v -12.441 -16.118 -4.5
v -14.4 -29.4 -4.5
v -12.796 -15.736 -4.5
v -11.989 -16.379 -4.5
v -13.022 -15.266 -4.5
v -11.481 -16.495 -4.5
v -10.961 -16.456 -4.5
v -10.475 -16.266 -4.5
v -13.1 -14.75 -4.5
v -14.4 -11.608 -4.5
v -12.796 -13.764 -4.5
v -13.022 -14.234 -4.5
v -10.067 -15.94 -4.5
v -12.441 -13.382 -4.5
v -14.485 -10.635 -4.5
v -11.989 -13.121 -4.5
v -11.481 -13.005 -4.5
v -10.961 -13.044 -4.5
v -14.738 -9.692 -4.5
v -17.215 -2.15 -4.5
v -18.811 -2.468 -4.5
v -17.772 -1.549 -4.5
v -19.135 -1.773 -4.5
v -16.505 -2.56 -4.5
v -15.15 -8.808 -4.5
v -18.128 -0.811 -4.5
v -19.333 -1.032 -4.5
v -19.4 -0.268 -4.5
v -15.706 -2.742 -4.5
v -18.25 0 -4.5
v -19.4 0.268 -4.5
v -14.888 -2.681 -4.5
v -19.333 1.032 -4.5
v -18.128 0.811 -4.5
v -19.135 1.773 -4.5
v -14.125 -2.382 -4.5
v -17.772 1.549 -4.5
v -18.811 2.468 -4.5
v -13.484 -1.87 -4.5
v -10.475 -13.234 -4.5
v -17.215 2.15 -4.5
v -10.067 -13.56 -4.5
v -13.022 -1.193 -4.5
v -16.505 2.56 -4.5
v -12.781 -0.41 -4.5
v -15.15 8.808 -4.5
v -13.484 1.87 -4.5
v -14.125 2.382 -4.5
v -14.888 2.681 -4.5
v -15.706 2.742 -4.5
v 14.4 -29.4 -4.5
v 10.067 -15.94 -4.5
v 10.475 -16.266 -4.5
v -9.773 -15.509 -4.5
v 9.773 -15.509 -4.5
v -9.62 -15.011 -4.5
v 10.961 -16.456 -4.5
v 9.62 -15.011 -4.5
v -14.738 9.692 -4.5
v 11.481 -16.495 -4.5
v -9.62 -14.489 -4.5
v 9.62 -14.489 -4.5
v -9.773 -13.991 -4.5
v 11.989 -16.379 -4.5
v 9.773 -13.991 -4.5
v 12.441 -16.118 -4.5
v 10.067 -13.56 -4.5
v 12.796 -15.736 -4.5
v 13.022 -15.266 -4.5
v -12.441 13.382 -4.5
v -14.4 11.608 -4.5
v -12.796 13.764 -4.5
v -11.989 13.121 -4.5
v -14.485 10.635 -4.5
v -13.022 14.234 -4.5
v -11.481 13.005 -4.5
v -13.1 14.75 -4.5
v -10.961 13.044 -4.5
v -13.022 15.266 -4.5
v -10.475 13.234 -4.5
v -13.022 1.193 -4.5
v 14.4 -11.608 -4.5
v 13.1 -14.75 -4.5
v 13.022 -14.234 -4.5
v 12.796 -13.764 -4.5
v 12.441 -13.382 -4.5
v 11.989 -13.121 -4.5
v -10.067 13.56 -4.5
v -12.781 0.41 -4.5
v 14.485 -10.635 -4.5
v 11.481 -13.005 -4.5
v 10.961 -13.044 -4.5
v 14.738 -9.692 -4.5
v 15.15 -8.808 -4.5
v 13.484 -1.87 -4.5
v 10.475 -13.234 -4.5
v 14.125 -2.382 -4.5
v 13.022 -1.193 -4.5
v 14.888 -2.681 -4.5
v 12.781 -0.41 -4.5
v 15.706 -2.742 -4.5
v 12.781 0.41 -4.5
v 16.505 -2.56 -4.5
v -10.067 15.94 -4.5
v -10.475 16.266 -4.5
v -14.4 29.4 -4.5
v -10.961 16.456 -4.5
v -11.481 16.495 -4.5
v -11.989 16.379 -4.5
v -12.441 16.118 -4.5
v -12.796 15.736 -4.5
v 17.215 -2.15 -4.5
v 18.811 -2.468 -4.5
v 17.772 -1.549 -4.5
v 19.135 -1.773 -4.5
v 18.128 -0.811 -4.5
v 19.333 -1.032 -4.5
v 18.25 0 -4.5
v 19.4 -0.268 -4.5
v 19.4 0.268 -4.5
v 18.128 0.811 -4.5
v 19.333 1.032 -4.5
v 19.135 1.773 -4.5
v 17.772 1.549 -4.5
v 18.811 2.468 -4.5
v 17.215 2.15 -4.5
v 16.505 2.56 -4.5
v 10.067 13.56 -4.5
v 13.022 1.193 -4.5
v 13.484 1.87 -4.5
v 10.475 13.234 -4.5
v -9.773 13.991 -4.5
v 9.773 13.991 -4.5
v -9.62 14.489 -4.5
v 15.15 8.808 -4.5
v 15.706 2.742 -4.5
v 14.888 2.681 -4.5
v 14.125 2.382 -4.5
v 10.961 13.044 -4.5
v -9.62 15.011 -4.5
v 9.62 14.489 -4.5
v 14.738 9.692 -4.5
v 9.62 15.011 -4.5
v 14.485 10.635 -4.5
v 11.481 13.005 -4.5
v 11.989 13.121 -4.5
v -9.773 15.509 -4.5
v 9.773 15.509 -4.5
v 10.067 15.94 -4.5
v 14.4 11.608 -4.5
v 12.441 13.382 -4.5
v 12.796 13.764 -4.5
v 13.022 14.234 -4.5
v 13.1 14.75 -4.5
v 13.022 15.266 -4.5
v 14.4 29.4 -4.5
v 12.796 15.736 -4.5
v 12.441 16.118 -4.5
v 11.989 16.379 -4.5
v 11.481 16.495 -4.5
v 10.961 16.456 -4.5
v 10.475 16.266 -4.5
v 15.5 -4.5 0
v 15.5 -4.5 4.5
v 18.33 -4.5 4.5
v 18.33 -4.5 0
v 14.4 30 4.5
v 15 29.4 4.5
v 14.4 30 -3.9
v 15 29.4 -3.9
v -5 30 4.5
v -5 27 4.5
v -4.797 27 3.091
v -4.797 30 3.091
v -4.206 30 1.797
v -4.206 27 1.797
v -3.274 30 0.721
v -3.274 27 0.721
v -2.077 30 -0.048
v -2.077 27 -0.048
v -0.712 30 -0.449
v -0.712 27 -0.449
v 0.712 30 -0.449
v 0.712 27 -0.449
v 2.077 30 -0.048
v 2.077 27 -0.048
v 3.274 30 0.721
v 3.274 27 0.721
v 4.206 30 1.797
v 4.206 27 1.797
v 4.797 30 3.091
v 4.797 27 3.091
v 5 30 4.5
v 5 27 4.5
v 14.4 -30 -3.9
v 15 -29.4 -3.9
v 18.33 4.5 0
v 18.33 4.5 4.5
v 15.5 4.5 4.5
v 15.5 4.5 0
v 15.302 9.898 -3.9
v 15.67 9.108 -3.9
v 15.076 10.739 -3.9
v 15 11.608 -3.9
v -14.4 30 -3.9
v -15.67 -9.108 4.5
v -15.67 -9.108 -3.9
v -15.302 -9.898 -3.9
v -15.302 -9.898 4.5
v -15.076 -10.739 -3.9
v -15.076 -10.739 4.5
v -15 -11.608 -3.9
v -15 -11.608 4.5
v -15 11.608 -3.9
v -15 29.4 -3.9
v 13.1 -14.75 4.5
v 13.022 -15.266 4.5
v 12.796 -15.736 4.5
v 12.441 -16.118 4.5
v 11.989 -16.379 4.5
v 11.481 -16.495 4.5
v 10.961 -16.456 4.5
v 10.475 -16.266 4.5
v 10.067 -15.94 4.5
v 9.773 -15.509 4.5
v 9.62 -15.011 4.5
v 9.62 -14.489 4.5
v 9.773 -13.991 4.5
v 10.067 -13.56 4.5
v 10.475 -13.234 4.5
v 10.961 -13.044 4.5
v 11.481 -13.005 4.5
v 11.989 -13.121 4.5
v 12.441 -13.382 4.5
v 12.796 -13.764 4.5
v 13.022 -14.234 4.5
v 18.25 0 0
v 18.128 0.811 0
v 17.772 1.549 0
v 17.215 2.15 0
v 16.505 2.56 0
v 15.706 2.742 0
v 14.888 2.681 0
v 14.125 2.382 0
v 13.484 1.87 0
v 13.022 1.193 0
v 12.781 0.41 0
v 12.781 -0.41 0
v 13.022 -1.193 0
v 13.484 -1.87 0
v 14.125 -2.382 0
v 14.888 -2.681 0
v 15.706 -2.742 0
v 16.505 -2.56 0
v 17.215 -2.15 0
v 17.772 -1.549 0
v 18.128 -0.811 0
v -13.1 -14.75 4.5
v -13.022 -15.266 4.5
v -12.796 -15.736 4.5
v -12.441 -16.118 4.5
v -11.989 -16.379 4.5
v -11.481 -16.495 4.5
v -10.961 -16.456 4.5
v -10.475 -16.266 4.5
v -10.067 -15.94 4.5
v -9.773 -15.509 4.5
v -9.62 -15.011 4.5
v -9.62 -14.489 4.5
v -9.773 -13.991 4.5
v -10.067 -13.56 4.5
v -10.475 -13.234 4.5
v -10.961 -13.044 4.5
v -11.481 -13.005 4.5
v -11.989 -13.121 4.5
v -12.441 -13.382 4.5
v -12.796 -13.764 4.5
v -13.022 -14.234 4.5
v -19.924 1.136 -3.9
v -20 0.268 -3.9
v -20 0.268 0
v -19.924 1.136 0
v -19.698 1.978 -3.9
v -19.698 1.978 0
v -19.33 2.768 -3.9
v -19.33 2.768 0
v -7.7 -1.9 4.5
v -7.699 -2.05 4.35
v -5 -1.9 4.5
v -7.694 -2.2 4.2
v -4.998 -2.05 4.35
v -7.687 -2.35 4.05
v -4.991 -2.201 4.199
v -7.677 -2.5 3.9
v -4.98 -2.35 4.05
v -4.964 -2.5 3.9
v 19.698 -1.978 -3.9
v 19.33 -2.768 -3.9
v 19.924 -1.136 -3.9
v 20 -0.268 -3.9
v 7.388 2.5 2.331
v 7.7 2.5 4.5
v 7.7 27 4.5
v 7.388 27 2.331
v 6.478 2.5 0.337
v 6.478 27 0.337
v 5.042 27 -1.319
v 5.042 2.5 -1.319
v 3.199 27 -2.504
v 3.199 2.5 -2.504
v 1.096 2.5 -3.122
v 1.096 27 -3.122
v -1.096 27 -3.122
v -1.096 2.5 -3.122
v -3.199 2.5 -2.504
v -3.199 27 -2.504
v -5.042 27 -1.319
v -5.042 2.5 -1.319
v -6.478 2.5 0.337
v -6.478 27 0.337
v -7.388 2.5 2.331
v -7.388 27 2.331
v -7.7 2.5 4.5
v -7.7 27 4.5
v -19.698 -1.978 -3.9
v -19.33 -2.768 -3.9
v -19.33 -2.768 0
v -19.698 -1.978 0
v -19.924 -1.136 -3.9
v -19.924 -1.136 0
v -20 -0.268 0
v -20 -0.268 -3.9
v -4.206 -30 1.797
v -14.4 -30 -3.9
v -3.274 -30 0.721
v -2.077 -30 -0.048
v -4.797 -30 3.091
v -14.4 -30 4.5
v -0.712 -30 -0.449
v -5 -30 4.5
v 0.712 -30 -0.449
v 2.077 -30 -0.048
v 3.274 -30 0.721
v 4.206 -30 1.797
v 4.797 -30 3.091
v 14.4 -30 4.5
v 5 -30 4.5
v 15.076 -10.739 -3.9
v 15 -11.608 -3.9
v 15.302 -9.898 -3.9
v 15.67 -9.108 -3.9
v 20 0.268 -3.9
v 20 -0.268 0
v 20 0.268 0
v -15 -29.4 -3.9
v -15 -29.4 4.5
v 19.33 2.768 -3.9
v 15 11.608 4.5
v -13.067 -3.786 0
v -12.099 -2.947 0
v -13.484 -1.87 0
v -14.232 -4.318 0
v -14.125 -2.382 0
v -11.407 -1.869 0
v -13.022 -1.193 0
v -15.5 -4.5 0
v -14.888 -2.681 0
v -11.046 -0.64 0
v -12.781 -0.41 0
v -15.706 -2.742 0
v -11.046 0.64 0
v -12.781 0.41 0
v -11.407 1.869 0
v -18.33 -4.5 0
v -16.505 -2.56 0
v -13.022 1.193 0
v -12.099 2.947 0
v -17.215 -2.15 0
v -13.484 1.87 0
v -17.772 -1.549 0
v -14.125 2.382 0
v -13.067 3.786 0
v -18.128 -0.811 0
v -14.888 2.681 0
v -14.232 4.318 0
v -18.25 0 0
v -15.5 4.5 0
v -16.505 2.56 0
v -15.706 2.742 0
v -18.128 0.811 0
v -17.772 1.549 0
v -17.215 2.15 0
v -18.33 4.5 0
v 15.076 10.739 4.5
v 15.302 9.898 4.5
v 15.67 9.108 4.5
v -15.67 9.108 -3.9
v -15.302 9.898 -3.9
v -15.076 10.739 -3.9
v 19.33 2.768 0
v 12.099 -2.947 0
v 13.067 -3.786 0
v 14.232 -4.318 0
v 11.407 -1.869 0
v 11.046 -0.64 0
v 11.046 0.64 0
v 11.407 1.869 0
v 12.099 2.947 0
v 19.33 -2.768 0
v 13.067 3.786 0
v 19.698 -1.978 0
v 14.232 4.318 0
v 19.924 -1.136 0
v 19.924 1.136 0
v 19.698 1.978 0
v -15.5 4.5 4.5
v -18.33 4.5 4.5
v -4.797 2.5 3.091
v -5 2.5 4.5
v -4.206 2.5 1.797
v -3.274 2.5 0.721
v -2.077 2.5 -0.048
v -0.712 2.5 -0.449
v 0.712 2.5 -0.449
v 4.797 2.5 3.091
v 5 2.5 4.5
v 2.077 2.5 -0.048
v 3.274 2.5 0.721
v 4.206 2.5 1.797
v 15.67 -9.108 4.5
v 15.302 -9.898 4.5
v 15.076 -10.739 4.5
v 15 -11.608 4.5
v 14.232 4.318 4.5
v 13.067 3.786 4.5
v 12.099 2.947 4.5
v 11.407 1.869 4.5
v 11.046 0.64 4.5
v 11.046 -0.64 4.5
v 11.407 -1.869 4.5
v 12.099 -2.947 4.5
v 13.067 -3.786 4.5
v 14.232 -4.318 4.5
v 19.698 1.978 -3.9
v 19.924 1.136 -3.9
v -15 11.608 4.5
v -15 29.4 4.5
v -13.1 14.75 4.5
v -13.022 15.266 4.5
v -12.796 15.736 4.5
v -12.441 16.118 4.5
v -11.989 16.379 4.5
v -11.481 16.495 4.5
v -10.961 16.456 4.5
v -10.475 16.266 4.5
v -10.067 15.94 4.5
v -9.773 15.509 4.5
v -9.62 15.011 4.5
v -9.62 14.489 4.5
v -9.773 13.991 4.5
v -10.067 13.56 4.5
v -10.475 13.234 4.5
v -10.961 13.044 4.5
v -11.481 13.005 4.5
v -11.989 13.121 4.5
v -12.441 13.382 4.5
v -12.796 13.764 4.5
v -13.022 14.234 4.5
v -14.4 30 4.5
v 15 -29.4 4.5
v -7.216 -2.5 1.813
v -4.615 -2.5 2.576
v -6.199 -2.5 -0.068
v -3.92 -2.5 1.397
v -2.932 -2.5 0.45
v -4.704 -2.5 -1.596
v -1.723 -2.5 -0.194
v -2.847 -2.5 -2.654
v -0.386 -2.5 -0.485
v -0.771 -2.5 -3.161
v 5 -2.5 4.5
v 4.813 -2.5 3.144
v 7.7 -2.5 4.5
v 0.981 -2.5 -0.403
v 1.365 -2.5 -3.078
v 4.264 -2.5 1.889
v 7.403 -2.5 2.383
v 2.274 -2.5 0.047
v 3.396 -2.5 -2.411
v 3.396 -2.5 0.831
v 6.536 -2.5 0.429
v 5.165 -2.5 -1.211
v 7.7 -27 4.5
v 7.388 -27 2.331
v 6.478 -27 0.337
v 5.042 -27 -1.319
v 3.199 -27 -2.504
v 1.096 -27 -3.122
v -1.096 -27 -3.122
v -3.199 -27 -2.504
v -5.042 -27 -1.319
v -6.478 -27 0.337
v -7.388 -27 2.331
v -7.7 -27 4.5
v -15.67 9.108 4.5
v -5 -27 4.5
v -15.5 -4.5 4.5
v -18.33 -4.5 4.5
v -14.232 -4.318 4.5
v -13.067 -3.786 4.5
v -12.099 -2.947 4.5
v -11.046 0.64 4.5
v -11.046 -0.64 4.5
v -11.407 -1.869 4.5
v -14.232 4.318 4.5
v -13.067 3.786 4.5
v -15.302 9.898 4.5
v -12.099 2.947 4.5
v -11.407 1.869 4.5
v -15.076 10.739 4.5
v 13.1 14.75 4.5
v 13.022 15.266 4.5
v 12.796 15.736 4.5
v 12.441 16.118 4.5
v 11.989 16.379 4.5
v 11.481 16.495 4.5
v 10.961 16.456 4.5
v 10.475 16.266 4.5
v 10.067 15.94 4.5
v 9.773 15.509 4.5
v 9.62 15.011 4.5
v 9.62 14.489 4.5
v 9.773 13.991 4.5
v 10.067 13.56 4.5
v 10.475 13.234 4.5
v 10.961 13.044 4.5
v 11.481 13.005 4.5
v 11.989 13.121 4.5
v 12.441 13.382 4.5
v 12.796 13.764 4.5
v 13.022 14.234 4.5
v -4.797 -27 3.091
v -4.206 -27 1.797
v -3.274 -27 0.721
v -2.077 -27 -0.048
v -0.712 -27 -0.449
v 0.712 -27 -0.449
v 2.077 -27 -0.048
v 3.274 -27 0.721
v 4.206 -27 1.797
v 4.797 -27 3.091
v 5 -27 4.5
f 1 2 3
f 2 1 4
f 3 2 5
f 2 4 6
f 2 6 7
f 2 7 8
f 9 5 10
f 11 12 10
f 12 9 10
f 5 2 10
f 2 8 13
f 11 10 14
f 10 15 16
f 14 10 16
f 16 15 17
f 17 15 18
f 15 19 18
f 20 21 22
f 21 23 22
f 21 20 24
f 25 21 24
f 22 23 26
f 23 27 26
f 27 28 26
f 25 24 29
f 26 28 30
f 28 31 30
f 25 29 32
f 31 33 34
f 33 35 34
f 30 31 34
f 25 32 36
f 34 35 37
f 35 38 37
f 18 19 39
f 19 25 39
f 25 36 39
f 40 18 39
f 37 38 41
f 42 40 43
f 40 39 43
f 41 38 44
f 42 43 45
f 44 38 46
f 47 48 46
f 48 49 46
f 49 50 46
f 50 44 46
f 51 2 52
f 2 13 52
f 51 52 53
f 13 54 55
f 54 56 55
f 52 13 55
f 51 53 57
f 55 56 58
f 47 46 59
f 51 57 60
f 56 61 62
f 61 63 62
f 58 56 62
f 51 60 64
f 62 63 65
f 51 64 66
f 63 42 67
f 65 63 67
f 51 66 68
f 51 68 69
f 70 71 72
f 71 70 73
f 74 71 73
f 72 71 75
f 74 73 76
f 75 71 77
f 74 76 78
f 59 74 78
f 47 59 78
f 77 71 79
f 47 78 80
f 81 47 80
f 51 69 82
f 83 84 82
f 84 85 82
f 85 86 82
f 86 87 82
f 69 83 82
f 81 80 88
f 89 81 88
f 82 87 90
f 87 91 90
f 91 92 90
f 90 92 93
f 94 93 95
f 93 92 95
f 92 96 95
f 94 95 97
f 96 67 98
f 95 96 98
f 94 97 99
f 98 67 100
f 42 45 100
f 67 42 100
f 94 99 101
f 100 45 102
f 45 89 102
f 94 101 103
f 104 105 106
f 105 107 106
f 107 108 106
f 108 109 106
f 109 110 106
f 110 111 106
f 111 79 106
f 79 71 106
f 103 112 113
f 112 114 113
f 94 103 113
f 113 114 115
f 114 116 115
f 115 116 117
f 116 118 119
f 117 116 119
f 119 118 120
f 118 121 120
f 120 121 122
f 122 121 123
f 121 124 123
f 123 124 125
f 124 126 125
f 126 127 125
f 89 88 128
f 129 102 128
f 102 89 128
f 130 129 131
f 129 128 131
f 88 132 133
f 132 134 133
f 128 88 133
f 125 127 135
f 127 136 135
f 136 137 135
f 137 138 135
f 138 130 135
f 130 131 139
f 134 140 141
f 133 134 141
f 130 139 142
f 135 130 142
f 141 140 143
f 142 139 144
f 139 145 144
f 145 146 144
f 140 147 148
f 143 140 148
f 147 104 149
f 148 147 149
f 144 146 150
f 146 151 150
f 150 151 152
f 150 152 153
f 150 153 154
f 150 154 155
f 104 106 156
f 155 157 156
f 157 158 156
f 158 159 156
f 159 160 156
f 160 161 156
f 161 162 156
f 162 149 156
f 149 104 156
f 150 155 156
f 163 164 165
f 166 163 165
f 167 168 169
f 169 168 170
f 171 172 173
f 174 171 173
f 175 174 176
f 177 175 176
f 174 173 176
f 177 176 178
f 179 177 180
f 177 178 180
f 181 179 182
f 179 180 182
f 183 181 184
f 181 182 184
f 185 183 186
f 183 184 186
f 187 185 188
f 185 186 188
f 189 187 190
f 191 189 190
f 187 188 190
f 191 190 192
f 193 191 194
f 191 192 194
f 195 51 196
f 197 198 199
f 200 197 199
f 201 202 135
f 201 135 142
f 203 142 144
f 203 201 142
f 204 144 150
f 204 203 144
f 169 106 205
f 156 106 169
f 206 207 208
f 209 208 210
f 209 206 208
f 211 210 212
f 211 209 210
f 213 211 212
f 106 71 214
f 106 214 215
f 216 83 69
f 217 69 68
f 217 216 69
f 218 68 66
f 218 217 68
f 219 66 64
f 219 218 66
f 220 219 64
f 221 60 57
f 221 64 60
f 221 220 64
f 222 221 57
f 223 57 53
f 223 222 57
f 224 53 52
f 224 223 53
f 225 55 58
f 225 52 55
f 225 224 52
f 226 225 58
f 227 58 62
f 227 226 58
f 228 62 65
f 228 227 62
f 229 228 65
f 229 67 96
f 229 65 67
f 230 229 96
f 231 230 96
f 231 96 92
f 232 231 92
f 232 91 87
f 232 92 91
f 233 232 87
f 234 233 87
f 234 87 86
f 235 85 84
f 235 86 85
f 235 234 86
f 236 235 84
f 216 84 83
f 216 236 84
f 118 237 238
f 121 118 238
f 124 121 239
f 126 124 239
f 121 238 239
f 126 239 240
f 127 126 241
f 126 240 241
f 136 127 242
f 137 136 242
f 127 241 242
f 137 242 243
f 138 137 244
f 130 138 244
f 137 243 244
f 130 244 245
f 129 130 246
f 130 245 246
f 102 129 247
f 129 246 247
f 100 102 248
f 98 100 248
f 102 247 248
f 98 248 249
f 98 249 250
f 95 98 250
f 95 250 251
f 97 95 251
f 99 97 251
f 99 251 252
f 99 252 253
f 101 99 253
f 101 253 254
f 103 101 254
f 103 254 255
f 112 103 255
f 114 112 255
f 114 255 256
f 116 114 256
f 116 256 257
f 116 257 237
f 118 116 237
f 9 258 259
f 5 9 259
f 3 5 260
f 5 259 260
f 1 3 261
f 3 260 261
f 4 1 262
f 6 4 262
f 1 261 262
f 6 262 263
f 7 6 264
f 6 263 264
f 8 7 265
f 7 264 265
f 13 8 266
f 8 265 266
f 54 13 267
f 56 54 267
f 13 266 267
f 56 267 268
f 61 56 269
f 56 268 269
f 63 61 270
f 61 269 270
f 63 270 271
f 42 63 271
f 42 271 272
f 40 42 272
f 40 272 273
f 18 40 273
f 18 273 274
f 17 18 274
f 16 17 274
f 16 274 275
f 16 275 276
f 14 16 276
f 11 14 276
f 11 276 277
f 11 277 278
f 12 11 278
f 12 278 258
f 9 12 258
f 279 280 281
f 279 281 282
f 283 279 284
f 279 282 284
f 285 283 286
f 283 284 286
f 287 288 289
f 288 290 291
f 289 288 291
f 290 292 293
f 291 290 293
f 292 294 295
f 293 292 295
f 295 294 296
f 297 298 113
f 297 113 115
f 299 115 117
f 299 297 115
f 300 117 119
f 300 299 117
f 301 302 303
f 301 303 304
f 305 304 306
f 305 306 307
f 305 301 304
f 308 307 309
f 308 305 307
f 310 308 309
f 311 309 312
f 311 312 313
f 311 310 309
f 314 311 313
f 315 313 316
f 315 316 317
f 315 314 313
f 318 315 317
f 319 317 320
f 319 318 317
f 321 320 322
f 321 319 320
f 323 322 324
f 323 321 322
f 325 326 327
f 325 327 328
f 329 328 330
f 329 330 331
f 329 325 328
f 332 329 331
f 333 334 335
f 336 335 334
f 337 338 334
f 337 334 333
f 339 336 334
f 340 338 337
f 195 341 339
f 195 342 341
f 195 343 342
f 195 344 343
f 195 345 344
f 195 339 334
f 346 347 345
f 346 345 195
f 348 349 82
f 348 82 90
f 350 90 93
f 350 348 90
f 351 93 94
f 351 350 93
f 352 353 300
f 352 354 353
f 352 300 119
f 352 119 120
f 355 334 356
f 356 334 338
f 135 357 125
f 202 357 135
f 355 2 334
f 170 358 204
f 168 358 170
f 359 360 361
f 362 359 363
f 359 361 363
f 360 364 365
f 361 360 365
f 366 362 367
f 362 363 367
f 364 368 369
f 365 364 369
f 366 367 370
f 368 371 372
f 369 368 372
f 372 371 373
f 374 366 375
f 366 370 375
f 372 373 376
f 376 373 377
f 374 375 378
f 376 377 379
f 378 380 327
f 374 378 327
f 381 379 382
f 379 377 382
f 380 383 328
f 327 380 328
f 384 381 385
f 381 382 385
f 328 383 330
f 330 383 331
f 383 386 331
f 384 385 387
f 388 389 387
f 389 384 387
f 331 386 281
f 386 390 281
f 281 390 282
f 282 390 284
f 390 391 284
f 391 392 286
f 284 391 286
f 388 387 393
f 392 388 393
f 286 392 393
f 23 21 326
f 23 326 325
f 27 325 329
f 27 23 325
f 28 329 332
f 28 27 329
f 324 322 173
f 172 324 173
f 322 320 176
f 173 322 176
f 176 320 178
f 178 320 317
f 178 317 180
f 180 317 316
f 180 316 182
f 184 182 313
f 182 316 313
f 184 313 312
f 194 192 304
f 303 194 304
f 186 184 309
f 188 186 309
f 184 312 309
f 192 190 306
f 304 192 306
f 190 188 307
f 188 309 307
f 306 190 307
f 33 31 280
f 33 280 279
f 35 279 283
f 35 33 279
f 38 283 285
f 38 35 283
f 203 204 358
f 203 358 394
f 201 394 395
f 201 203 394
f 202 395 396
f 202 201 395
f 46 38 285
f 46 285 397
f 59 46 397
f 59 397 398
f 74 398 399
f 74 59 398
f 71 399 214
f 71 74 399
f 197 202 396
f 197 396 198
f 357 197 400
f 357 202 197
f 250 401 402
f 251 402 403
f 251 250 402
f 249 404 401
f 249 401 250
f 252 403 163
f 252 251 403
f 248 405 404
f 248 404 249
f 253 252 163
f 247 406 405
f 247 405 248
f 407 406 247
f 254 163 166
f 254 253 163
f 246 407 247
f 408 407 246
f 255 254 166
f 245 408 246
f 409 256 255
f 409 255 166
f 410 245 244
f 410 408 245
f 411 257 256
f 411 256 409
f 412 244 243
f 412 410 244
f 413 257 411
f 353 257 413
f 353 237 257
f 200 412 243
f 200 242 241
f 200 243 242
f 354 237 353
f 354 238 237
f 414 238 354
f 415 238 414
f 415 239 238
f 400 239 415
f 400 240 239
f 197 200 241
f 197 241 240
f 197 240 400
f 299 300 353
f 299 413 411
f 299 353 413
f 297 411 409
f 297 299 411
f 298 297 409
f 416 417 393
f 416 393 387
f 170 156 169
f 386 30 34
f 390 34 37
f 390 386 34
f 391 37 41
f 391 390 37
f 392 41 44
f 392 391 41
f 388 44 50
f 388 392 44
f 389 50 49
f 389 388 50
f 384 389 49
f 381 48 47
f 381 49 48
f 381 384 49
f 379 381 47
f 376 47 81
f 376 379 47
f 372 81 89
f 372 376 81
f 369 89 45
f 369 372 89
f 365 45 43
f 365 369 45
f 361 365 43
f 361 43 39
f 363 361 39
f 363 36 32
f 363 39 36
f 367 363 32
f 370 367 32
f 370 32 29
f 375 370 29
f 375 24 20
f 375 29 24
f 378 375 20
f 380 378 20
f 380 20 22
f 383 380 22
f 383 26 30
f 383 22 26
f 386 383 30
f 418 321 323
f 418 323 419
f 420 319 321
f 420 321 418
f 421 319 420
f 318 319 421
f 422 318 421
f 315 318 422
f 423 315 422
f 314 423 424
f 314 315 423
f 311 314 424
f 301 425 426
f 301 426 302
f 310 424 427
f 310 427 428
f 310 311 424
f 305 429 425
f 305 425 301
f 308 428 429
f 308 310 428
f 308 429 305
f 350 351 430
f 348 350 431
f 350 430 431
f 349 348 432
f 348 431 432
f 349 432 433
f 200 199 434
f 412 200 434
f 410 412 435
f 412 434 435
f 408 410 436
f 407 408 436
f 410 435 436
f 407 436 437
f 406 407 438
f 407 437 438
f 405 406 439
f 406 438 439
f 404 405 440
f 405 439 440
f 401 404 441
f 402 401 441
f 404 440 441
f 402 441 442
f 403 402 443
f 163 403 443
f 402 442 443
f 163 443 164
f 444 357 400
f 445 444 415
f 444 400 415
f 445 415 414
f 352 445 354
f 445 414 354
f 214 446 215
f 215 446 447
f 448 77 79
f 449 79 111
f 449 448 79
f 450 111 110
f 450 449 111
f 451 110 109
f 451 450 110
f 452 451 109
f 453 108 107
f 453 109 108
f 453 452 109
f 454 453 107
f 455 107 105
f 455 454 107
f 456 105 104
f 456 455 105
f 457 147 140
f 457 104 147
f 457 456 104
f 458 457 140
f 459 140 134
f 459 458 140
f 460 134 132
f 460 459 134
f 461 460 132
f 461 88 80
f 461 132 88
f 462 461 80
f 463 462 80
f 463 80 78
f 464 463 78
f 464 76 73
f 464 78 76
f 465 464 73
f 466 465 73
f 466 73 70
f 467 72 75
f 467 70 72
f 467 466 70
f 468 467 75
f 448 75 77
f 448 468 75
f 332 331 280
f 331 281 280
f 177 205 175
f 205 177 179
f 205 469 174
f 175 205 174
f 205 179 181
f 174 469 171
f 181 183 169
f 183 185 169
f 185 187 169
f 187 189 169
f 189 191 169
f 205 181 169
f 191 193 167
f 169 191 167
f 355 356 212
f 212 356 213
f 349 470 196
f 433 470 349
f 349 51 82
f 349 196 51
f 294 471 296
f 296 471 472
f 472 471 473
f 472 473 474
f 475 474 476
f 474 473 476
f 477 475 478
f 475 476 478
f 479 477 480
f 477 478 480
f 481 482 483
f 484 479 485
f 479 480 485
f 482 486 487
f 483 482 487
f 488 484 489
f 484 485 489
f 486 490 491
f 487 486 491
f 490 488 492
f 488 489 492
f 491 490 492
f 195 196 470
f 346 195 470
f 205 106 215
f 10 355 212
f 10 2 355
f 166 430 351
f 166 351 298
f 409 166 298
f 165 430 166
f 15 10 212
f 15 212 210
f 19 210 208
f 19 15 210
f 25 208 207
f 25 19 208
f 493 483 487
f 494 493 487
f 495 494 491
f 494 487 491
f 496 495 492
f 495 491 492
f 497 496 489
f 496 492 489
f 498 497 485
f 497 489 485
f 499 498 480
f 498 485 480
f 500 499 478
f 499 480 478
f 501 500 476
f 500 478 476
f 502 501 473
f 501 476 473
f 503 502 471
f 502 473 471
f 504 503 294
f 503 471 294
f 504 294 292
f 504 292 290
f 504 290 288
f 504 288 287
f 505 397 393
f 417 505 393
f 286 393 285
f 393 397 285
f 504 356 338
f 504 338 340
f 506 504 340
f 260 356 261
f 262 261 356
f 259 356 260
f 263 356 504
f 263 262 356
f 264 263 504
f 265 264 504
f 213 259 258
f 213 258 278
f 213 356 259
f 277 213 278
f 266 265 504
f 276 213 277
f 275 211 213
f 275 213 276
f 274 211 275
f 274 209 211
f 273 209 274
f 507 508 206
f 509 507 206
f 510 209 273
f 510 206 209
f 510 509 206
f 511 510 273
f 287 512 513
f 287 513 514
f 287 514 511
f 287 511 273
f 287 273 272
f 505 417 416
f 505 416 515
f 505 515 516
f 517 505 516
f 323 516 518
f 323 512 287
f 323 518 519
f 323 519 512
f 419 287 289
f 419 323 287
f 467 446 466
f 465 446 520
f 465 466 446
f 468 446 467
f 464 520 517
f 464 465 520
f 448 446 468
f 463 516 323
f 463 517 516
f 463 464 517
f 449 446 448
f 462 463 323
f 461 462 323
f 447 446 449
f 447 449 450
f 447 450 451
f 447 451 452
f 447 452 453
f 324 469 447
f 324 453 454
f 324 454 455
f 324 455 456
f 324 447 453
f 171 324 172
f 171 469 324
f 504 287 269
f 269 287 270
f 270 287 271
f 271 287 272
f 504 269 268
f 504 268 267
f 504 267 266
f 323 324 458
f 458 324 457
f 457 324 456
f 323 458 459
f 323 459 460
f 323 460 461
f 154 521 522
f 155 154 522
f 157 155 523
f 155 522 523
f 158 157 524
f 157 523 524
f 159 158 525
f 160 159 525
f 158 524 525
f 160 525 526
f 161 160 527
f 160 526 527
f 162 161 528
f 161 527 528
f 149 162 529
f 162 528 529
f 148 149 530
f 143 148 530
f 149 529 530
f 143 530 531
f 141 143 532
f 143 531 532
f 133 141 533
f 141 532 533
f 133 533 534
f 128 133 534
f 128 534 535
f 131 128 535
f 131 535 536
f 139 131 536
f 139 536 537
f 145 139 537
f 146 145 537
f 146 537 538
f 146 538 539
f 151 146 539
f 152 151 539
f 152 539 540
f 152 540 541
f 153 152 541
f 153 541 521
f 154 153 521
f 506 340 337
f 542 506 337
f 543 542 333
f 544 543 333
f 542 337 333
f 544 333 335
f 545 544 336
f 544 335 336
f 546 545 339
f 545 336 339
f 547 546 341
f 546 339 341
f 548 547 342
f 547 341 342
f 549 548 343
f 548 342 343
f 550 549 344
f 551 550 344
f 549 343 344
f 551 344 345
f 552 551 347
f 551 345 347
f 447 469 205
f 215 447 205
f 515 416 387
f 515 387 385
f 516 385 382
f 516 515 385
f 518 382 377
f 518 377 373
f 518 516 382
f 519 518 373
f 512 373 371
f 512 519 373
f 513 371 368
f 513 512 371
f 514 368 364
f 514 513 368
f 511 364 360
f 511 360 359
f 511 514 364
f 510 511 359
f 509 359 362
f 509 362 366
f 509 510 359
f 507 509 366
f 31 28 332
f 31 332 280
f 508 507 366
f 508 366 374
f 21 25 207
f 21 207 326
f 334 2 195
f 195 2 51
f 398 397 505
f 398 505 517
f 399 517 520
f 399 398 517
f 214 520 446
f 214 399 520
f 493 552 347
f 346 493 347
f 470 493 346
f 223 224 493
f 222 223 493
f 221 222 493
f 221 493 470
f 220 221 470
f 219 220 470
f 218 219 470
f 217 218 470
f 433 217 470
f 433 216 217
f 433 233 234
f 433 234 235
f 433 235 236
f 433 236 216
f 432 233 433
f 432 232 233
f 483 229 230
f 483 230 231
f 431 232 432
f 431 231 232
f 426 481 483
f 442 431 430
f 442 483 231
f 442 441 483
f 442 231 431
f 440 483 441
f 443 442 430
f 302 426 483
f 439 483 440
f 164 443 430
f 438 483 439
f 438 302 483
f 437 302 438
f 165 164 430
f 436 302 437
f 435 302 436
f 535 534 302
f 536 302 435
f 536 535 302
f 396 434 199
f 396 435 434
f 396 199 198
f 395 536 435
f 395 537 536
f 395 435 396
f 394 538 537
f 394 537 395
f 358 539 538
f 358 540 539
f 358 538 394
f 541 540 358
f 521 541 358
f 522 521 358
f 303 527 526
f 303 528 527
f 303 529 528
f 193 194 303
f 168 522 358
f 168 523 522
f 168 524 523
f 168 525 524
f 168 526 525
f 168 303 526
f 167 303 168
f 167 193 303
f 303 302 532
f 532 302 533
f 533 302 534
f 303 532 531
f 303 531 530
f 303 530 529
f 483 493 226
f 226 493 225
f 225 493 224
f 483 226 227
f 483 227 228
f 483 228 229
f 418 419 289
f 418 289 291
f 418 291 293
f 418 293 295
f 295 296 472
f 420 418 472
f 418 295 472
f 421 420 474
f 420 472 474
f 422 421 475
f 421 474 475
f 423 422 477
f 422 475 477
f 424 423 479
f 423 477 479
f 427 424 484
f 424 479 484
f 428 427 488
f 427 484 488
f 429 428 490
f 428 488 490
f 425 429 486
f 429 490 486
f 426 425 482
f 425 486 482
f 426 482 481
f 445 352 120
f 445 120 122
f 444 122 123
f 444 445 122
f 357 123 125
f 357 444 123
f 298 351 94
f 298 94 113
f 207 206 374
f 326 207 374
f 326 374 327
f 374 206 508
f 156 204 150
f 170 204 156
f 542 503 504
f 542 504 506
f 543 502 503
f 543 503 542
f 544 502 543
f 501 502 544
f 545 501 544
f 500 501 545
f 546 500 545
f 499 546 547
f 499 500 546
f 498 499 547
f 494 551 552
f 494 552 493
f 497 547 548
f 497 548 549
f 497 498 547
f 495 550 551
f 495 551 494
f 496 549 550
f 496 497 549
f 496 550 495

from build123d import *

# Parameters (mm, degrees)
ESBO_O1_W                    = 30
ESBO_O1_H                    = 60
RESSALTO_EXTRUS_O1_DEPTH     = 4.5
CORTE_EXTRUS_O2_DEPTH        = 63.010079826
CORTE_EXTRUS_O3_START        = -24.5
CORTE_EXTRUS_O3_DEPTH        = 24.5
ESBO_O4_W                    = 9
ESBO_O4_H                    = 24
RESSALTO_EXTRUS_O3_DEPTH     = 5
CHANFRO1_SIZE                = 6
CHANFRO1_SIZE_2              = 10.392304845
FILETE2_R                    = 5
CHANFRO1_OF_ESPELHAR2_SIZE   = 6
CHANFRO1_OF_ESPELHAR2_SIZE_2 = 10.392304845
FILETE3_R                    = 5
ESBO_O5_R                    = 2.75
CORTE_EXTRUS_O4_DEPTH        = 38.161808352
ESBO_O6_R                    = 4.5
ESBO_O6_R_2                  = 2.75
CORTE_EXTRUS_O5_DEPTH        = 4.5
ESBO_O7_R                    = 1.75
CORTE_EXTRUS_O6_DEPTH        = 38.161808352
ESPELHAR4_COPY_1_SKETCH_R    = 1.75
ESPELHAR4_COPY_1_DEPTH       = 38.161808352
CHANFRO2_SIZE                = 0.6


with BuildPart() as part:
    # Esboço1 → Ressalto-extrusão1 (new, symmetric)
    with BuildSketch(Plane.XY):
        Rectangle(ESBO_O1_W, ESBO_O1_H)
    extrude(amount=RESSALTO_EXTRUS_O1_DEPTH, both=True)

    # Esboço2 → Corte-extrusão2 (cut, through all)
    with BuildSketch(Plane.XZ.offset(30)):
        with BuildLine():
            Line((-5, 58.363424399), (-5, 4.5))
            ThreePointArc((-5, 4.5), (0, -0.5), (5, 4.5))
            Line((5, 4.5), (5, 58.363424399))
            Line((5, 58.363424399), (5, 166.090273197))
            Line((5, 166.090273197), (-5, 166.090273197))
            Line((-5, 166.090273197), (-5, 58.363424399))
        make_face()
    extrude(amount=-CORTE_EXTRUS_O2_DEPTH, mode=Mode.SUBTRACT)

    # Esboço3 → Corte-extrusão3 (cut)
    with BuildSketch(Plane(origin=(0, 27, 0), x_dir=(1, 0, 0), z_dir=(0, 1, 0)).offset(CORTE_EXTRUS_O3_START)):
        with BuildLine():
            ThreePointArc((-5, -4.5), (0, 0.5), (5, -4.5))
            Line((5, -4.5), (7.7, -4.5))
            ThreePointArc((7.7, -4.5), (0, 3.2), (-7.7, -4.5))
            Line((-7.7, -4.5), (-5, -4.5))
        make_face()
    corte_extrus_o3 = extrude(amount=CORTE_EXTRUS_O3_DEPTH, mode=Mode.SUBTRACT)

    # Espelhar1: Corte-extrusão3 across plane
    add(corte_extrus_o3.mirror(Plane.ZX), mode=Mode.SUBTRACT)

    # Esboço4 → Ressalto-extrusão3 (add)
    with BuildSketch(Plane(origin=(15, 0, 0), x_dir=(0, 0, -1), z_dir=(1, 0, 0))):
        Rectangle(ESBO_O4_W, ESBO_O4_H)
    ressalto_extrus_o3 = extrude(amount=RESSALTO_EXTRUS_O3_DEPTH)

    # Chanfro1
    # the kernel refuses this chamfer: 10.392304845, 6 mm, written as the material it takes off along each edge
    with BuildSketch(Plane(origin=(20, 12, -31.385783824), x_dir=(-0.9983227437537926, 0.05789386240267147, 0), z_dir=(0, 0, 1))) as chanfro1_piece_1_section:
        Polygon((CHANFRO1_SIZE * 0.998322743754, CHANFRO1_SIZE * 0.0578938624027), (-CHANFRO1_SIZE_2 * 0.057893862405, CHANFRO1_SIZE_2 * 0.998322743793), (0, 0), align=None)
    chanfro1_piece_1 = extrude(amount=62.771567647, mode=Mode.PRIVATE)
    chanfro1_piece_1 = split(chanfro1_piece_1, bisect_by=Plane(origin=(15, 8.382110688, 0), z_dir=(1, 0, 0)), keep=Keep.TOP, mode=Mode.PRIVATE)
    add(chanfro1_piece_1, mode=Mode.SUBTRACT)
    with BuildSketch(Plane(origin=(20, -12, 31.385783824), x_dir=(-0.9983227437537926, -0.05789386240267147, 0), z_dir=(0, 0, -1))) as chanfro1_piece_2_section:
        Polygon((CHANFRO1_SIZE * 0.998322743754, CHANFRO1_SIZE * 0.0578938624027), (-CHANFRO1_SIZE_2 * 0.057893862405, CHANFRO1_SIZE_2 * 0.998322743793), (0, 0), align=None)
    chanfro1_piece_2 = extrude(amount=62.771567647, mode=Mode.PRIVATE)
    chanfro1_piece_2 = split(chanfro1_piece_2, bisect_by=Plane(origin=(15, -8.382110688, 0), z_dir=(1, 0, 0)), keep=Keep.TOP, mode=Mode.PRIVATE)
    add(chanfro1_piece_2, mode=Mode.SUBTRACT)

    # Filete2
    filete2_edges = [part.edges().sort_by_distance(p)[0] for p in [
        (20, -1.607695155, 0),
        (20, 1.607695155, 0),
        (15, 10.267949192, 0),
        (15, -10.267949192, 0),
    ]]
    fillet(filete2_edges, radius=FILETE2_R)

    # Espelhar2: Ressalto-extrusão3 across plane
    add(ressalto_extrus_o3.mirror(Plane(origin=(0, 0, 0), x_dir=(0, 0, 1), z_dir=(1, 0, 0))))

    # Chanfro1 of Espelhar2
    # the kernel refuses this chamfer: 10.392304845, 6 mm, written as the material it takes off along each edge
    with BuildSketch(Plane(origin=(-20, 12, -31.385783824), x_dir=(0.9983227437537926, 0.05789386240267147, 0), z_dir=(0, 0, 1))) as chanfro1_of_espelhar2_piece_1_section:
        Polygon((CHANFRO1_OF_ESPELHAR2_SIZE * 0.998322743754, -CHANFRO1_OF_ESPELHAR2_SIZE * 0.0578938624027), (-CHANFRO1_OF_ESPELHAR2_SIZE_2 * 0.057893862405, -CHANFRO1_OF_ESPELHAR2_SIZE_2 * 0.998322743793), (0, 0), align=None)
    chanfro1_of_espelhar2_piece_1 = extrude(amount=62.771567647, mode=Mode.PRIVATE)
    chanfro1_of_espelhar2_piece_1 = split(chanfro1_of_espelhar2_piece_1, bisect_by=Plane(origin=(-15, 8.382110688, 0), z_dir=(-1, 0, 0)), keep=Keep.TOP, mode=Mode.PRIVATE)
    add(chanfro1_of_espelhar2_piece_1, mode=Mode.SUBTRACT)
    with BuildSketch(Plane(origin=(-20, -12, 31.385783824), x_dir=(0.9983227437537926, -0.05789386240267147, 0), z_dir=(0, 0, -1))) as chanfro1_of_espelhar2_piece_2_section:
        Polygon((CHANFRO1_OF_ESPELHAR2_SIZE * 0.998322743754, -CHANFRO1_OF_ESPELHAR2_SIZE * 0.0578938624027), (-CHANFRO1_OF_ESPELHAR2_SIZE_2 * 0.057893862405, -CHANFRO1_OF_ESPELHAR2_SIZE_2 * 0.998322743793), (0, 0), align=None)
    chanfro1_of_espelhar2_piece_2 = extrude(amount=62.771567647, mode=Mode.PRIVATE)
    chanfro1_of_espelhar2_piece_2 = split(chanfro1_of_espelhar2_piece_2, bisect_by=Plane(origin=(-15, -8.382110688, 0), z_dir=(-1, 0, 0)), keep=Keep.TOP, mode=Mode.PRIVATE)
    add(chanfro1_of_espelhar2_piece_2, mode=Mode.SUBTRACT)

    # Filete3
    filete3_edges = [part.edges().sort_by_distance(p)[0] for p in [
        (-20, -1.607695155, 0),
        (-20, 1.607695155, 0),
        (-15, 10.267949192, 0),
        (-15, -10.267949192, 0),
    ]]
    fillet(filete3_edges, radius=FILETE3_R)

    # Esboço5 → Corte-extrusão4 (cut, through all)
    with BuildSketch(Plane.XY.offset(4.5)):
        with Locations((15.5, 0)):
            Circle(ESBO_O5_R)
    corte_extrus_o4 = extrude(amount=-CORTE_EXTRUS_O4_DEPTH, mode=Mode.SUBTRACT)

    # Esboço6 → Corte-extrusão5 (cut)
    # profile 1 of 3: a face of its own
    with BuildSketch(Plane.XY.offset(4.5)):
        with BuildLine():
            Line((18.330127019, 4.5), (15.5, 4.5))
            ThreePointArc((15.5, 4.5), (18.681980515, 3.181980515), (20, 0))
            Line((20, 0), (20, 0.267949192))
            ThreePointArc((20, 0.267949192), (19.829629131, 1.562044418), (19.330127019, 2.767949192))
            Line((19.330127019, 2.767949192), (18.330127019, 4.5))
        make_face()
    # profile 2 of 3: a face of its own
    with BuildSketch(Plane.XY.offset(4.5)):
        with Locations((15.5, 0)):
            Circle(ESBO_O6_R)
        with Locations((15.5, 0)):
            Circle(ESBO_O6_R_2, mode=Mode.SUBTRACT)
    # profile 3 of 3: a face of its own
    with BuildSketch(Plane.XY.offset(4.5)):
        with BuildLine():
            Line((20, -0.267949192), (20, 0))
            ThreePointArc((20, 0), (18.681980515, -3.181980515), (15.5, -4.5))
            Line((15.5, -4.5), (18.330127019, -4.5))
            Line((18.330127019, -4.5), (19.330127019, -2.767949192))
            ThreePointArc((19.330127019, -2.767949192), (19.829629131, -1.562044418), (20, -0.267949192))
        make_face()
    corte_extrus_o5 = extrude(amount=-CORTE_EXTRUS_O5_DEPTH, mode=Mode.SUBTRACT)

    # Espelhar5: Corte-extrusão4, Corte-extrusão5 across plane
    add(corte_extrus_o4.mirror(Plane(origin=(0, 0, 0), x_dir=(0, 0, 1), z_dir=(1, 0, 0))), mode=Mode.SUBTRACT)
    add(corte_extrus_o5.mirror(Plane(origin=(0, 0, 0), x_dir=(0, 0, 1), z_dir=(1, 0, 0))), mode=Mode.SUBTRACT)

    # Esboço7 → Corte-extrusão6 (cut, through all)
    with BuildSketch(Plane.XY.offset(4.5)):
        with Locations((11.35, 14.75)):
            Circle(ESBO_O7_R)
    corte_extrus_o6 = extrude(amount=-CORTE_EXTRUS_O6_DEPTH, mode=Mode.SUBTRACT)

    # Espelhar3: Corte-extrusão6 across plane
    add(corte_extrus_o6.mirror(Plane.ZX), mode=Mode.SUBTRACT)

    # Espelhar4: Corte-extrusão6 across plane
    add(corte_extrus_o6.mirror(Plane(origin=(0, 0, 0), x_dir=(0, 0, 1), z_dir=(1, 0, 0))), mode=Mode.SUBTRACT)

    # Espelhar4 copy 1 sketch → Espelhar4 copy 1 (cut, through all)
    with BuildSketch(Plane(origin=(0, 0, 4.5), x_dir=(-1, 0, 0), z_dir=(0, 0, 1))):
        with Locations((11.35, 14.75)):
            Circle(ESPELHAR4_COPY_1_SKETCH_R)
    extrude(amount=-ESPELHAR4_COPY_1_DEPTH, mode=Mode.SUBTRACT)

    # Chanfro2
    chanfro2_edges = [part.edges().sort_by_distance(p)[0] for p in [
        (17.5, 5.937822174, -4.5),
        (17.5, -5.937822174, -4.5),
        (20, 0, -4.5),
        (19.829629131, -1.562044418, -4.5),
        (19.829629131, 1.562044418, -4.5),
        (15.170370869, 10.313599929, -4.5),
        (15.170370869, -10.313599929, -4.5),
        (-15, -20.803847577, -4.5),
        (-17.5, -5.937822174, -4.5),
        (-17.5, 5.937822174, -4.5),
        (-20, 0, -4.5),
        (-19.829629131, -1.562044418, -4.5),
        (-19.829629131, 1.562044418, -4.5),
        (-15.170370869, -10.313599929, -4.5),
        (-15.170370869, 10.313599929, -4.5),
        (-6.35, -2.5, 4.5),
        (0, -30, -4.5),
        (-15, 20.803847577, -4.5),
        (0, 30, -4.5),
        (15, -20.803847577, -4.5),
        (15, -30, 0),
        (-15, -30, 0),
        (-15, 30, 0),
        (15, 30, 0),
        (15, 20.803847577, -4.5),
    ]]
    chamfer(chanfro2_edges, length=CHANFRO2_SIZE)


solid = part.part
